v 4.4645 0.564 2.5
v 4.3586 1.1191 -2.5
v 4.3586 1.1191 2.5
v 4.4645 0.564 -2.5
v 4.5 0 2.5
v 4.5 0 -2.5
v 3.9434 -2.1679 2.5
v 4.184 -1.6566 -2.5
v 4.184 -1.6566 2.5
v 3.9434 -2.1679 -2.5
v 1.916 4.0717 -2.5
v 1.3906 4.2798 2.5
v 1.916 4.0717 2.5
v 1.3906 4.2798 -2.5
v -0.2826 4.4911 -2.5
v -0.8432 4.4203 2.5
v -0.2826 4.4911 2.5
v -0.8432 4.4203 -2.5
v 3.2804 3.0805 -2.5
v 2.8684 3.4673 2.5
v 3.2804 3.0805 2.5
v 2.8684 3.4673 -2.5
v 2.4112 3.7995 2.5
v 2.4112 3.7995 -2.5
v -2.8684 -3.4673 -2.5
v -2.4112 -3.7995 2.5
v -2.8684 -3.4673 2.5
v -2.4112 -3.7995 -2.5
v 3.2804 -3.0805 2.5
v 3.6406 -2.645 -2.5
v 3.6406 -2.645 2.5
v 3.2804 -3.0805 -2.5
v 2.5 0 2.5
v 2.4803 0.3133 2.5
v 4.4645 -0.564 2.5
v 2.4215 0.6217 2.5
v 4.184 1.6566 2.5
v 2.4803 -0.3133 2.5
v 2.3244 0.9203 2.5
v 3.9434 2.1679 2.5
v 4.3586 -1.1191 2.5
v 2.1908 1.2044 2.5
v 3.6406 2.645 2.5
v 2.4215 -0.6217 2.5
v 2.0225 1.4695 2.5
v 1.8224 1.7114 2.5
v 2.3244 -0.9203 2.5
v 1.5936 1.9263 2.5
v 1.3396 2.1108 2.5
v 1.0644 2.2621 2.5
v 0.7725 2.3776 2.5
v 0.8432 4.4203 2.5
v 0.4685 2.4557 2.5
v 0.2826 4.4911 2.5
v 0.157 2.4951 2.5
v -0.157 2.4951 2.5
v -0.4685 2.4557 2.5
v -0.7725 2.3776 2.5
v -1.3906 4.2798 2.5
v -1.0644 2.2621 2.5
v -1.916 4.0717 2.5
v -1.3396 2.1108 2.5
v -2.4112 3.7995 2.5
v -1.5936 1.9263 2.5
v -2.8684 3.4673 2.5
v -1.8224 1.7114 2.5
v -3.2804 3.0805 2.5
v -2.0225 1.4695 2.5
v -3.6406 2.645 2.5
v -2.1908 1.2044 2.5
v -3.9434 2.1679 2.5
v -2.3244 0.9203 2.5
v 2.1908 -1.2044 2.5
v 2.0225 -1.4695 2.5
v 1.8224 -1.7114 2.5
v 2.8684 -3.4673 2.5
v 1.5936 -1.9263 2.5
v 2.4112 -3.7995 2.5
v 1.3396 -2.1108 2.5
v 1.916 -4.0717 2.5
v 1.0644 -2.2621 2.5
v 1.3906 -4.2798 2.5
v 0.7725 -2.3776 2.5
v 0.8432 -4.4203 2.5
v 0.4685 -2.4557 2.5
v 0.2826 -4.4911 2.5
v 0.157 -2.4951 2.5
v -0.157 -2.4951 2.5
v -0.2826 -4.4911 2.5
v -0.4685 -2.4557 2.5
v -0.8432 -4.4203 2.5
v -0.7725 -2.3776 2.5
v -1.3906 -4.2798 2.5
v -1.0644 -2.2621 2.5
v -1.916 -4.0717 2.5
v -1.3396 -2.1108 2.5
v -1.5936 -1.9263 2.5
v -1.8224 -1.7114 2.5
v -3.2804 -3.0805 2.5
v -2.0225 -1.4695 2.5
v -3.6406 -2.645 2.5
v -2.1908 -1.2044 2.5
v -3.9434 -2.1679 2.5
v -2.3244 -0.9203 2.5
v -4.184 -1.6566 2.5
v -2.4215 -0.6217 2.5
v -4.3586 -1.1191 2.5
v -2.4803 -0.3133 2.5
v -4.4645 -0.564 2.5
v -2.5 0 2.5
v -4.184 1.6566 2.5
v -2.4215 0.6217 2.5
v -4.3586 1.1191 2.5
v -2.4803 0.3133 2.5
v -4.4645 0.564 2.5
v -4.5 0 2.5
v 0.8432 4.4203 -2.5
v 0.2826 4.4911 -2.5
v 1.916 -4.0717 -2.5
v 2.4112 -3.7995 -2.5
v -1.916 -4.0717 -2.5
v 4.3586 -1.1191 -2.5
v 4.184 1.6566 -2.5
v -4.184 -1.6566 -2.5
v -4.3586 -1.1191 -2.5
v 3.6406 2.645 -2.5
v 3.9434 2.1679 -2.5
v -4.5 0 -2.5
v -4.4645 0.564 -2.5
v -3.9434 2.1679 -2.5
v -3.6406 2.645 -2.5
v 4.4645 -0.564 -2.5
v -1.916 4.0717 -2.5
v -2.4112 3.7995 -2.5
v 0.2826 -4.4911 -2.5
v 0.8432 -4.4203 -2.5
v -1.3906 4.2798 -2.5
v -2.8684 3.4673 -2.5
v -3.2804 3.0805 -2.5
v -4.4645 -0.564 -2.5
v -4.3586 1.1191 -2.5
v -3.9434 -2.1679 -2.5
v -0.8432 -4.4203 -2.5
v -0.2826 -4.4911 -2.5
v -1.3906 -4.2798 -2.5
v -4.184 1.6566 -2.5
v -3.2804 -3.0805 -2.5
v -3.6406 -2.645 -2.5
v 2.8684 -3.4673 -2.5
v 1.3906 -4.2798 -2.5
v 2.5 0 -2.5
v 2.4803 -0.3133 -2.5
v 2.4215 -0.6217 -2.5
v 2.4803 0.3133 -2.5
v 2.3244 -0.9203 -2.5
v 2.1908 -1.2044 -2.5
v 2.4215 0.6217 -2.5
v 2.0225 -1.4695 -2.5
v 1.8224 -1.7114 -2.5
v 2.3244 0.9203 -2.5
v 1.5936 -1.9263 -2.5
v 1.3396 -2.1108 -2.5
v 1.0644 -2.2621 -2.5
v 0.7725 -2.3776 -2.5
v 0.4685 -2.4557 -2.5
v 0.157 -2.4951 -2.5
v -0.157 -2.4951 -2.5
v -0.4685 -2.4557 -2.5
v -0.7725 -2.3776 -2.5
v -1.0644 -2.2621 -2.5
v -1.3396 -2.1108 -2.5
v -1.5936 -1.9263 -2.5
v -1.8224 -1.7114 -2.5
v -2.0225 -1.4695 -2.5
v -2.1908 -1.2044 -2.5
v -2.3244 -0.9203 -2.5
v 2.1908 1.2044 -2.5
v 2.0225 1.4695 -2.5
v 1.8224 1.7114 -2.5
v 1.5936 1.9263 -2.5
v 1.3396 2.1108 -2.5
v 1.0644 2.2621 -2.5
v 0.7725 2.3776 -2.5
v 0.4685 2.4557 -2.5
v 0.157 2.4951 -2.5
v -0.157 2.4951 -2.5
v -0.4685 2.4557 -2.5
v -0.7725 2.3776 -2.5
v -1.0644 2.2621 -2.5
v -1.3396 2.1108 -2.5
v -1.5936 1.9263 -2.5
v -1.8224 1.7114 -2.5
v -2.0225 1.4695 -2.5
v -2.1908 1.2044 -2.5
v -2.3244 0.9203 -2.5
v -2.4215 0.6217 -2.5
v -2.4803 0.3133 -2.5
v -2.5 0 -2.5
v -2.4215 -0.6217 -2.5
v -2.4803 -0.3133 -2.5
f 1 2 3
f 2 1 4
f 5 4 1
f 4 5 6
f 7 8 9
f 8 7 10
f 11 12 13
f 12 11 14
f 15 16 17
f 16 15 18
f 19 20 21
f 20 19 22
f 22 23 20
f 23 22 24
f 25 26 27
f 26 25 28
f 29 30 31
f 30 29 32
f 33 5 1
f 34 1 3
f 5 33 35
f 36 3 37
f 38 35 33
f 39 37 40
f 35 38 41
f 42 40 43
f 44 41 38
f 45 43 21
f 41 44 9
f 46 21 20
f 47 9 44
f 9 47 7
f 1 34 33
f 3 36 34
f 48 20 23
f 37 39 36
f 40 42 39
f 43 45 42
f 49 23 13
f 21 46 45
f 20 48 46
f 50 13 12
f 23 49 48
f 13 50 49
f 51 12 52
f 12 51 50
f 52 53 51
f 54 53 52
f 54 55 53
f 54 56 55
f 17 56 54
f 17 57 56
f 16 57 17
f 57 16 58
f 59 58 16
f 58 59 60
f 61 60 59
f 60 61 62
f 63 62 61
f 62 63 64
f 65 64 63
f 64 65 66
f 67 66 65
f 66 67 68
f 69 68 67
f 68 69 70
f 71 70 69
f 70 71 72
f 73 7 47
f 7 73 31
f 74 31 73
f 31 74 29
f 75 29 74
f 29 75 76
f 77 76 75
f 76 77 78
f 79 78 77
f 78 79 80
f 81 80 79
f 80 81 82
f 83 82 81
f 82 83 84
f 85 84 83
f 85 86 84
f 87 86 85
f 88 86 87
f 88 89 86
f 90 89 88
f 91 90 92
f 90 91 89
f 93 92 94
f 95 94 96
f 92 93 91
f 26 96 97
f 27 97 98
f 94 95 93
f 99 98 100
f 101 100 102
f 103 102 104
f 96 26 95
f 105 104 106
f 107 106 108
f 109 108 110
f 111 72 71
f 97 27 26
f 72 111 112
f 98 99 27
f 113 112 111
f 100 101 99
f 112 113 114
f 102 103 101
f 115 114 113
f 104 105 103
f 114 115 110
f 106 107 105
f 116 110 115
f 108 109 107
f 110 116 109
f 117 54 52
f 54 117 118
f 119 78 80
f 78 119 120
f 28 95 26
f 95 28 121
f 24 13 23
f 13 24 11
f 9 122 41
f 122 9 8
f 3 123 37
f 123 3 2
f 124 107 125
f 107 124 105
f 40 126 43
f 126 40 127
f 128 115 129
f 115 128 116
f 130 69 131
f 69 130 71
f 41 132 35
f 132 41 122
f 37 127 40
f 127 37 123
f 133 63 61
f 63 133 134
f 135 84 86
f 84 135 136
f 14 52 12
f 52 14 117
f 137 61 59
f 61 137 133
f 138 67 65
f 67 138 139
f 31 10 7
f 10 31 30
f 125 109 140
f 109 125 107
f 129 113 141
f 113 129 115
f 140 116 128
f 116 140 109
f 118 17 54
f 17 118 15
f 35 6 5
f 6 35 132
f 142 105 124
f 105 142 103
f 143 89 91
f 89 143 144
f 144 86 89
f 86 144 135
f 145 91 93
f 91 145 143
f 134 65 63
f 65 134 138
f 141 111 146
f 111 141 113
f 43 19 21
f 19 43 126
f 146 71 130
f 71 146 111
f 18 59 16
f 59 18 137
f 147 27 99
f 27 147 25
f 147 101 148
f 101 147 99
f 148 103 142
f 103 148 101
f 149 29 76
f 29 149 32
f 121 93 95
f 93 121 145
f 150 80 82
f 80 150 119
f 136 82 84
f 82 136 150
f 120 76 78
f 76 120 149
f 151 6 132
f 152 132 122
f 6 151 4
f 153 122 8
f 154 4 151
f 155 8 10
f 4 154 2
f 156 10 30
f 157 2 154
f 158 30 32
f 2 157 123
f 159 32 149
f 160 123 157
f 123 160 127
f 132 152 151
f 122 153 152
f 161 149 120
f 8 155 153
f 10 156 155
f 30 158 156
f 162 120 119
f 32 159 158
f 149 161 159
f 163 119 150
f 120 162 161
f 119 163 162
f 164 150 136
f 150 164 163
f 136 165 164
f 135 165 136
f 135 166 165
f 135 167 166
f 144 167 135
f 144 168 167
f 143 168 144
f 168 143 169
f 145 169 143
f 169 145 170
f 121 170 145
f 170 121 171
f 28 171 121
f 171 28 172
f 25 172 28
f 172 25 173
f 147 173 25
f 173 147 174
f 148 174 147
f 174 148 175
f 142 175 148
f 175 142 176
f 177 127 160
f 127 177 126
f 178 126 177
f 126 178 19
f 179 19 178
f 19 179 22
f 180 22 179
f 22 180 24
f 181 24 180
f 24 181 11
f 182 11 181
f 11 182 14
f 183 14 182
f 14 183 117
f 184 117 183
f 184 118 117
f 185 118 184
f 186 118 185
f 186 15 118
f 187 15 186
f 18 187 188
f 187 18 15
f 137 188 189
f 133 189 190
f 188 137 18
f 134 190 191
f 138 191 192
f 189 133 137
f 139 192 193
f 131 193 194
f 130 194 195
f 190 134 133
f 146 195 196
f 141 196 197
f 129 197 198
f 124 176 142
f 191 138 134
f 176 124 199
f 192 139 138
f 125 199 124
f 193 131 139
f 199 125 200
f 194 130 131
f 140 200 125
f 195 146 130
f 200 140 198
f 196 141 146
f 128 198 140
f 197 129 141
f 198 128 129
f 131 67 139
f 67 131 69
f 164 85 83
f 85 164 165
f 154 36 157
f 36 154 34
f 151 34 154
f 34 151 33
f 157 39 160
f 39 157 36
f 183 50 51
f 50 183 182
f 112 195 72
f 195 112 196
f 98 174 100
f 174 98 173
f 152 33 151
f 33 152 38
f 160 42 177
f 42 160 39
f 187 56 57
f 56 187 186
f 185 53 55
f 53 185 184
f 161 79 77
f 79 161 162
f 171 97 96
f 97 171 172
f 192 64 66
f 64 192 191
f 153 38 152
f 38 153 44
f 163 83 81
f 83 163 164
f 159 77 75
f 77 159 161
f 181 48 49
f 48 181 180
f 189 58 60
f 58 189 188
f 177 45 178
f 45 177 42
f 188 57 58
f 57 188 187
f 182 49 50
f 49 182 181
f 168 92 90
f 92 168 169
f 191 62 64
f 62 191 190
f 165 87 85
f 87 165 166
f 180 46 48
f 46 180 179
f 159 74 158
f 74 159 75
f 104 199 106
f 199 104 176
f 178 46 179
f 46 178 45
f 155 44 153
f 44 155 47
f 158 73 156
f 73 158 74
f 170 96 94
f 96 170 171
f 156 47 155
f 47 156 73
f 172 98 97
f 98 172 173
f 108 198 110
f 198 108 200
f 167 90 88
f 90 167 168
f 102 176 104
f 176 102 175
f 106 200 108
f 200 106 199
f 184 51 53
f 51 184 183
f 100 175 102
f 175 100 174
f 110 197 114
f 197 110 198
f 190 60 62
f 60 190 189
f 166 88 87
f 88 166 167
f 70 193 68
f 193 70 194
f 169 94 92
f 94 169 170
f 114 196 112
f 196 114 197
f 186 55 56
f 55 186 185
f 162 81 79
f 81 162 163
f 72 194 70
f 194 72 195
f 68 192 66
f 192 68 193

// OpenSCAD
$fn = 50;


difference() {
	union() {
		translate(v = [0, 0, -2.5000000000]) {
			cylinder(h = 5, r = 4.5000000000);
		}
	}
	union() {
		translate(v = [0, 0, -100.0000000000]) {
			cylinder(h = 200, r = 2.5000000000);
		}
	}
}
